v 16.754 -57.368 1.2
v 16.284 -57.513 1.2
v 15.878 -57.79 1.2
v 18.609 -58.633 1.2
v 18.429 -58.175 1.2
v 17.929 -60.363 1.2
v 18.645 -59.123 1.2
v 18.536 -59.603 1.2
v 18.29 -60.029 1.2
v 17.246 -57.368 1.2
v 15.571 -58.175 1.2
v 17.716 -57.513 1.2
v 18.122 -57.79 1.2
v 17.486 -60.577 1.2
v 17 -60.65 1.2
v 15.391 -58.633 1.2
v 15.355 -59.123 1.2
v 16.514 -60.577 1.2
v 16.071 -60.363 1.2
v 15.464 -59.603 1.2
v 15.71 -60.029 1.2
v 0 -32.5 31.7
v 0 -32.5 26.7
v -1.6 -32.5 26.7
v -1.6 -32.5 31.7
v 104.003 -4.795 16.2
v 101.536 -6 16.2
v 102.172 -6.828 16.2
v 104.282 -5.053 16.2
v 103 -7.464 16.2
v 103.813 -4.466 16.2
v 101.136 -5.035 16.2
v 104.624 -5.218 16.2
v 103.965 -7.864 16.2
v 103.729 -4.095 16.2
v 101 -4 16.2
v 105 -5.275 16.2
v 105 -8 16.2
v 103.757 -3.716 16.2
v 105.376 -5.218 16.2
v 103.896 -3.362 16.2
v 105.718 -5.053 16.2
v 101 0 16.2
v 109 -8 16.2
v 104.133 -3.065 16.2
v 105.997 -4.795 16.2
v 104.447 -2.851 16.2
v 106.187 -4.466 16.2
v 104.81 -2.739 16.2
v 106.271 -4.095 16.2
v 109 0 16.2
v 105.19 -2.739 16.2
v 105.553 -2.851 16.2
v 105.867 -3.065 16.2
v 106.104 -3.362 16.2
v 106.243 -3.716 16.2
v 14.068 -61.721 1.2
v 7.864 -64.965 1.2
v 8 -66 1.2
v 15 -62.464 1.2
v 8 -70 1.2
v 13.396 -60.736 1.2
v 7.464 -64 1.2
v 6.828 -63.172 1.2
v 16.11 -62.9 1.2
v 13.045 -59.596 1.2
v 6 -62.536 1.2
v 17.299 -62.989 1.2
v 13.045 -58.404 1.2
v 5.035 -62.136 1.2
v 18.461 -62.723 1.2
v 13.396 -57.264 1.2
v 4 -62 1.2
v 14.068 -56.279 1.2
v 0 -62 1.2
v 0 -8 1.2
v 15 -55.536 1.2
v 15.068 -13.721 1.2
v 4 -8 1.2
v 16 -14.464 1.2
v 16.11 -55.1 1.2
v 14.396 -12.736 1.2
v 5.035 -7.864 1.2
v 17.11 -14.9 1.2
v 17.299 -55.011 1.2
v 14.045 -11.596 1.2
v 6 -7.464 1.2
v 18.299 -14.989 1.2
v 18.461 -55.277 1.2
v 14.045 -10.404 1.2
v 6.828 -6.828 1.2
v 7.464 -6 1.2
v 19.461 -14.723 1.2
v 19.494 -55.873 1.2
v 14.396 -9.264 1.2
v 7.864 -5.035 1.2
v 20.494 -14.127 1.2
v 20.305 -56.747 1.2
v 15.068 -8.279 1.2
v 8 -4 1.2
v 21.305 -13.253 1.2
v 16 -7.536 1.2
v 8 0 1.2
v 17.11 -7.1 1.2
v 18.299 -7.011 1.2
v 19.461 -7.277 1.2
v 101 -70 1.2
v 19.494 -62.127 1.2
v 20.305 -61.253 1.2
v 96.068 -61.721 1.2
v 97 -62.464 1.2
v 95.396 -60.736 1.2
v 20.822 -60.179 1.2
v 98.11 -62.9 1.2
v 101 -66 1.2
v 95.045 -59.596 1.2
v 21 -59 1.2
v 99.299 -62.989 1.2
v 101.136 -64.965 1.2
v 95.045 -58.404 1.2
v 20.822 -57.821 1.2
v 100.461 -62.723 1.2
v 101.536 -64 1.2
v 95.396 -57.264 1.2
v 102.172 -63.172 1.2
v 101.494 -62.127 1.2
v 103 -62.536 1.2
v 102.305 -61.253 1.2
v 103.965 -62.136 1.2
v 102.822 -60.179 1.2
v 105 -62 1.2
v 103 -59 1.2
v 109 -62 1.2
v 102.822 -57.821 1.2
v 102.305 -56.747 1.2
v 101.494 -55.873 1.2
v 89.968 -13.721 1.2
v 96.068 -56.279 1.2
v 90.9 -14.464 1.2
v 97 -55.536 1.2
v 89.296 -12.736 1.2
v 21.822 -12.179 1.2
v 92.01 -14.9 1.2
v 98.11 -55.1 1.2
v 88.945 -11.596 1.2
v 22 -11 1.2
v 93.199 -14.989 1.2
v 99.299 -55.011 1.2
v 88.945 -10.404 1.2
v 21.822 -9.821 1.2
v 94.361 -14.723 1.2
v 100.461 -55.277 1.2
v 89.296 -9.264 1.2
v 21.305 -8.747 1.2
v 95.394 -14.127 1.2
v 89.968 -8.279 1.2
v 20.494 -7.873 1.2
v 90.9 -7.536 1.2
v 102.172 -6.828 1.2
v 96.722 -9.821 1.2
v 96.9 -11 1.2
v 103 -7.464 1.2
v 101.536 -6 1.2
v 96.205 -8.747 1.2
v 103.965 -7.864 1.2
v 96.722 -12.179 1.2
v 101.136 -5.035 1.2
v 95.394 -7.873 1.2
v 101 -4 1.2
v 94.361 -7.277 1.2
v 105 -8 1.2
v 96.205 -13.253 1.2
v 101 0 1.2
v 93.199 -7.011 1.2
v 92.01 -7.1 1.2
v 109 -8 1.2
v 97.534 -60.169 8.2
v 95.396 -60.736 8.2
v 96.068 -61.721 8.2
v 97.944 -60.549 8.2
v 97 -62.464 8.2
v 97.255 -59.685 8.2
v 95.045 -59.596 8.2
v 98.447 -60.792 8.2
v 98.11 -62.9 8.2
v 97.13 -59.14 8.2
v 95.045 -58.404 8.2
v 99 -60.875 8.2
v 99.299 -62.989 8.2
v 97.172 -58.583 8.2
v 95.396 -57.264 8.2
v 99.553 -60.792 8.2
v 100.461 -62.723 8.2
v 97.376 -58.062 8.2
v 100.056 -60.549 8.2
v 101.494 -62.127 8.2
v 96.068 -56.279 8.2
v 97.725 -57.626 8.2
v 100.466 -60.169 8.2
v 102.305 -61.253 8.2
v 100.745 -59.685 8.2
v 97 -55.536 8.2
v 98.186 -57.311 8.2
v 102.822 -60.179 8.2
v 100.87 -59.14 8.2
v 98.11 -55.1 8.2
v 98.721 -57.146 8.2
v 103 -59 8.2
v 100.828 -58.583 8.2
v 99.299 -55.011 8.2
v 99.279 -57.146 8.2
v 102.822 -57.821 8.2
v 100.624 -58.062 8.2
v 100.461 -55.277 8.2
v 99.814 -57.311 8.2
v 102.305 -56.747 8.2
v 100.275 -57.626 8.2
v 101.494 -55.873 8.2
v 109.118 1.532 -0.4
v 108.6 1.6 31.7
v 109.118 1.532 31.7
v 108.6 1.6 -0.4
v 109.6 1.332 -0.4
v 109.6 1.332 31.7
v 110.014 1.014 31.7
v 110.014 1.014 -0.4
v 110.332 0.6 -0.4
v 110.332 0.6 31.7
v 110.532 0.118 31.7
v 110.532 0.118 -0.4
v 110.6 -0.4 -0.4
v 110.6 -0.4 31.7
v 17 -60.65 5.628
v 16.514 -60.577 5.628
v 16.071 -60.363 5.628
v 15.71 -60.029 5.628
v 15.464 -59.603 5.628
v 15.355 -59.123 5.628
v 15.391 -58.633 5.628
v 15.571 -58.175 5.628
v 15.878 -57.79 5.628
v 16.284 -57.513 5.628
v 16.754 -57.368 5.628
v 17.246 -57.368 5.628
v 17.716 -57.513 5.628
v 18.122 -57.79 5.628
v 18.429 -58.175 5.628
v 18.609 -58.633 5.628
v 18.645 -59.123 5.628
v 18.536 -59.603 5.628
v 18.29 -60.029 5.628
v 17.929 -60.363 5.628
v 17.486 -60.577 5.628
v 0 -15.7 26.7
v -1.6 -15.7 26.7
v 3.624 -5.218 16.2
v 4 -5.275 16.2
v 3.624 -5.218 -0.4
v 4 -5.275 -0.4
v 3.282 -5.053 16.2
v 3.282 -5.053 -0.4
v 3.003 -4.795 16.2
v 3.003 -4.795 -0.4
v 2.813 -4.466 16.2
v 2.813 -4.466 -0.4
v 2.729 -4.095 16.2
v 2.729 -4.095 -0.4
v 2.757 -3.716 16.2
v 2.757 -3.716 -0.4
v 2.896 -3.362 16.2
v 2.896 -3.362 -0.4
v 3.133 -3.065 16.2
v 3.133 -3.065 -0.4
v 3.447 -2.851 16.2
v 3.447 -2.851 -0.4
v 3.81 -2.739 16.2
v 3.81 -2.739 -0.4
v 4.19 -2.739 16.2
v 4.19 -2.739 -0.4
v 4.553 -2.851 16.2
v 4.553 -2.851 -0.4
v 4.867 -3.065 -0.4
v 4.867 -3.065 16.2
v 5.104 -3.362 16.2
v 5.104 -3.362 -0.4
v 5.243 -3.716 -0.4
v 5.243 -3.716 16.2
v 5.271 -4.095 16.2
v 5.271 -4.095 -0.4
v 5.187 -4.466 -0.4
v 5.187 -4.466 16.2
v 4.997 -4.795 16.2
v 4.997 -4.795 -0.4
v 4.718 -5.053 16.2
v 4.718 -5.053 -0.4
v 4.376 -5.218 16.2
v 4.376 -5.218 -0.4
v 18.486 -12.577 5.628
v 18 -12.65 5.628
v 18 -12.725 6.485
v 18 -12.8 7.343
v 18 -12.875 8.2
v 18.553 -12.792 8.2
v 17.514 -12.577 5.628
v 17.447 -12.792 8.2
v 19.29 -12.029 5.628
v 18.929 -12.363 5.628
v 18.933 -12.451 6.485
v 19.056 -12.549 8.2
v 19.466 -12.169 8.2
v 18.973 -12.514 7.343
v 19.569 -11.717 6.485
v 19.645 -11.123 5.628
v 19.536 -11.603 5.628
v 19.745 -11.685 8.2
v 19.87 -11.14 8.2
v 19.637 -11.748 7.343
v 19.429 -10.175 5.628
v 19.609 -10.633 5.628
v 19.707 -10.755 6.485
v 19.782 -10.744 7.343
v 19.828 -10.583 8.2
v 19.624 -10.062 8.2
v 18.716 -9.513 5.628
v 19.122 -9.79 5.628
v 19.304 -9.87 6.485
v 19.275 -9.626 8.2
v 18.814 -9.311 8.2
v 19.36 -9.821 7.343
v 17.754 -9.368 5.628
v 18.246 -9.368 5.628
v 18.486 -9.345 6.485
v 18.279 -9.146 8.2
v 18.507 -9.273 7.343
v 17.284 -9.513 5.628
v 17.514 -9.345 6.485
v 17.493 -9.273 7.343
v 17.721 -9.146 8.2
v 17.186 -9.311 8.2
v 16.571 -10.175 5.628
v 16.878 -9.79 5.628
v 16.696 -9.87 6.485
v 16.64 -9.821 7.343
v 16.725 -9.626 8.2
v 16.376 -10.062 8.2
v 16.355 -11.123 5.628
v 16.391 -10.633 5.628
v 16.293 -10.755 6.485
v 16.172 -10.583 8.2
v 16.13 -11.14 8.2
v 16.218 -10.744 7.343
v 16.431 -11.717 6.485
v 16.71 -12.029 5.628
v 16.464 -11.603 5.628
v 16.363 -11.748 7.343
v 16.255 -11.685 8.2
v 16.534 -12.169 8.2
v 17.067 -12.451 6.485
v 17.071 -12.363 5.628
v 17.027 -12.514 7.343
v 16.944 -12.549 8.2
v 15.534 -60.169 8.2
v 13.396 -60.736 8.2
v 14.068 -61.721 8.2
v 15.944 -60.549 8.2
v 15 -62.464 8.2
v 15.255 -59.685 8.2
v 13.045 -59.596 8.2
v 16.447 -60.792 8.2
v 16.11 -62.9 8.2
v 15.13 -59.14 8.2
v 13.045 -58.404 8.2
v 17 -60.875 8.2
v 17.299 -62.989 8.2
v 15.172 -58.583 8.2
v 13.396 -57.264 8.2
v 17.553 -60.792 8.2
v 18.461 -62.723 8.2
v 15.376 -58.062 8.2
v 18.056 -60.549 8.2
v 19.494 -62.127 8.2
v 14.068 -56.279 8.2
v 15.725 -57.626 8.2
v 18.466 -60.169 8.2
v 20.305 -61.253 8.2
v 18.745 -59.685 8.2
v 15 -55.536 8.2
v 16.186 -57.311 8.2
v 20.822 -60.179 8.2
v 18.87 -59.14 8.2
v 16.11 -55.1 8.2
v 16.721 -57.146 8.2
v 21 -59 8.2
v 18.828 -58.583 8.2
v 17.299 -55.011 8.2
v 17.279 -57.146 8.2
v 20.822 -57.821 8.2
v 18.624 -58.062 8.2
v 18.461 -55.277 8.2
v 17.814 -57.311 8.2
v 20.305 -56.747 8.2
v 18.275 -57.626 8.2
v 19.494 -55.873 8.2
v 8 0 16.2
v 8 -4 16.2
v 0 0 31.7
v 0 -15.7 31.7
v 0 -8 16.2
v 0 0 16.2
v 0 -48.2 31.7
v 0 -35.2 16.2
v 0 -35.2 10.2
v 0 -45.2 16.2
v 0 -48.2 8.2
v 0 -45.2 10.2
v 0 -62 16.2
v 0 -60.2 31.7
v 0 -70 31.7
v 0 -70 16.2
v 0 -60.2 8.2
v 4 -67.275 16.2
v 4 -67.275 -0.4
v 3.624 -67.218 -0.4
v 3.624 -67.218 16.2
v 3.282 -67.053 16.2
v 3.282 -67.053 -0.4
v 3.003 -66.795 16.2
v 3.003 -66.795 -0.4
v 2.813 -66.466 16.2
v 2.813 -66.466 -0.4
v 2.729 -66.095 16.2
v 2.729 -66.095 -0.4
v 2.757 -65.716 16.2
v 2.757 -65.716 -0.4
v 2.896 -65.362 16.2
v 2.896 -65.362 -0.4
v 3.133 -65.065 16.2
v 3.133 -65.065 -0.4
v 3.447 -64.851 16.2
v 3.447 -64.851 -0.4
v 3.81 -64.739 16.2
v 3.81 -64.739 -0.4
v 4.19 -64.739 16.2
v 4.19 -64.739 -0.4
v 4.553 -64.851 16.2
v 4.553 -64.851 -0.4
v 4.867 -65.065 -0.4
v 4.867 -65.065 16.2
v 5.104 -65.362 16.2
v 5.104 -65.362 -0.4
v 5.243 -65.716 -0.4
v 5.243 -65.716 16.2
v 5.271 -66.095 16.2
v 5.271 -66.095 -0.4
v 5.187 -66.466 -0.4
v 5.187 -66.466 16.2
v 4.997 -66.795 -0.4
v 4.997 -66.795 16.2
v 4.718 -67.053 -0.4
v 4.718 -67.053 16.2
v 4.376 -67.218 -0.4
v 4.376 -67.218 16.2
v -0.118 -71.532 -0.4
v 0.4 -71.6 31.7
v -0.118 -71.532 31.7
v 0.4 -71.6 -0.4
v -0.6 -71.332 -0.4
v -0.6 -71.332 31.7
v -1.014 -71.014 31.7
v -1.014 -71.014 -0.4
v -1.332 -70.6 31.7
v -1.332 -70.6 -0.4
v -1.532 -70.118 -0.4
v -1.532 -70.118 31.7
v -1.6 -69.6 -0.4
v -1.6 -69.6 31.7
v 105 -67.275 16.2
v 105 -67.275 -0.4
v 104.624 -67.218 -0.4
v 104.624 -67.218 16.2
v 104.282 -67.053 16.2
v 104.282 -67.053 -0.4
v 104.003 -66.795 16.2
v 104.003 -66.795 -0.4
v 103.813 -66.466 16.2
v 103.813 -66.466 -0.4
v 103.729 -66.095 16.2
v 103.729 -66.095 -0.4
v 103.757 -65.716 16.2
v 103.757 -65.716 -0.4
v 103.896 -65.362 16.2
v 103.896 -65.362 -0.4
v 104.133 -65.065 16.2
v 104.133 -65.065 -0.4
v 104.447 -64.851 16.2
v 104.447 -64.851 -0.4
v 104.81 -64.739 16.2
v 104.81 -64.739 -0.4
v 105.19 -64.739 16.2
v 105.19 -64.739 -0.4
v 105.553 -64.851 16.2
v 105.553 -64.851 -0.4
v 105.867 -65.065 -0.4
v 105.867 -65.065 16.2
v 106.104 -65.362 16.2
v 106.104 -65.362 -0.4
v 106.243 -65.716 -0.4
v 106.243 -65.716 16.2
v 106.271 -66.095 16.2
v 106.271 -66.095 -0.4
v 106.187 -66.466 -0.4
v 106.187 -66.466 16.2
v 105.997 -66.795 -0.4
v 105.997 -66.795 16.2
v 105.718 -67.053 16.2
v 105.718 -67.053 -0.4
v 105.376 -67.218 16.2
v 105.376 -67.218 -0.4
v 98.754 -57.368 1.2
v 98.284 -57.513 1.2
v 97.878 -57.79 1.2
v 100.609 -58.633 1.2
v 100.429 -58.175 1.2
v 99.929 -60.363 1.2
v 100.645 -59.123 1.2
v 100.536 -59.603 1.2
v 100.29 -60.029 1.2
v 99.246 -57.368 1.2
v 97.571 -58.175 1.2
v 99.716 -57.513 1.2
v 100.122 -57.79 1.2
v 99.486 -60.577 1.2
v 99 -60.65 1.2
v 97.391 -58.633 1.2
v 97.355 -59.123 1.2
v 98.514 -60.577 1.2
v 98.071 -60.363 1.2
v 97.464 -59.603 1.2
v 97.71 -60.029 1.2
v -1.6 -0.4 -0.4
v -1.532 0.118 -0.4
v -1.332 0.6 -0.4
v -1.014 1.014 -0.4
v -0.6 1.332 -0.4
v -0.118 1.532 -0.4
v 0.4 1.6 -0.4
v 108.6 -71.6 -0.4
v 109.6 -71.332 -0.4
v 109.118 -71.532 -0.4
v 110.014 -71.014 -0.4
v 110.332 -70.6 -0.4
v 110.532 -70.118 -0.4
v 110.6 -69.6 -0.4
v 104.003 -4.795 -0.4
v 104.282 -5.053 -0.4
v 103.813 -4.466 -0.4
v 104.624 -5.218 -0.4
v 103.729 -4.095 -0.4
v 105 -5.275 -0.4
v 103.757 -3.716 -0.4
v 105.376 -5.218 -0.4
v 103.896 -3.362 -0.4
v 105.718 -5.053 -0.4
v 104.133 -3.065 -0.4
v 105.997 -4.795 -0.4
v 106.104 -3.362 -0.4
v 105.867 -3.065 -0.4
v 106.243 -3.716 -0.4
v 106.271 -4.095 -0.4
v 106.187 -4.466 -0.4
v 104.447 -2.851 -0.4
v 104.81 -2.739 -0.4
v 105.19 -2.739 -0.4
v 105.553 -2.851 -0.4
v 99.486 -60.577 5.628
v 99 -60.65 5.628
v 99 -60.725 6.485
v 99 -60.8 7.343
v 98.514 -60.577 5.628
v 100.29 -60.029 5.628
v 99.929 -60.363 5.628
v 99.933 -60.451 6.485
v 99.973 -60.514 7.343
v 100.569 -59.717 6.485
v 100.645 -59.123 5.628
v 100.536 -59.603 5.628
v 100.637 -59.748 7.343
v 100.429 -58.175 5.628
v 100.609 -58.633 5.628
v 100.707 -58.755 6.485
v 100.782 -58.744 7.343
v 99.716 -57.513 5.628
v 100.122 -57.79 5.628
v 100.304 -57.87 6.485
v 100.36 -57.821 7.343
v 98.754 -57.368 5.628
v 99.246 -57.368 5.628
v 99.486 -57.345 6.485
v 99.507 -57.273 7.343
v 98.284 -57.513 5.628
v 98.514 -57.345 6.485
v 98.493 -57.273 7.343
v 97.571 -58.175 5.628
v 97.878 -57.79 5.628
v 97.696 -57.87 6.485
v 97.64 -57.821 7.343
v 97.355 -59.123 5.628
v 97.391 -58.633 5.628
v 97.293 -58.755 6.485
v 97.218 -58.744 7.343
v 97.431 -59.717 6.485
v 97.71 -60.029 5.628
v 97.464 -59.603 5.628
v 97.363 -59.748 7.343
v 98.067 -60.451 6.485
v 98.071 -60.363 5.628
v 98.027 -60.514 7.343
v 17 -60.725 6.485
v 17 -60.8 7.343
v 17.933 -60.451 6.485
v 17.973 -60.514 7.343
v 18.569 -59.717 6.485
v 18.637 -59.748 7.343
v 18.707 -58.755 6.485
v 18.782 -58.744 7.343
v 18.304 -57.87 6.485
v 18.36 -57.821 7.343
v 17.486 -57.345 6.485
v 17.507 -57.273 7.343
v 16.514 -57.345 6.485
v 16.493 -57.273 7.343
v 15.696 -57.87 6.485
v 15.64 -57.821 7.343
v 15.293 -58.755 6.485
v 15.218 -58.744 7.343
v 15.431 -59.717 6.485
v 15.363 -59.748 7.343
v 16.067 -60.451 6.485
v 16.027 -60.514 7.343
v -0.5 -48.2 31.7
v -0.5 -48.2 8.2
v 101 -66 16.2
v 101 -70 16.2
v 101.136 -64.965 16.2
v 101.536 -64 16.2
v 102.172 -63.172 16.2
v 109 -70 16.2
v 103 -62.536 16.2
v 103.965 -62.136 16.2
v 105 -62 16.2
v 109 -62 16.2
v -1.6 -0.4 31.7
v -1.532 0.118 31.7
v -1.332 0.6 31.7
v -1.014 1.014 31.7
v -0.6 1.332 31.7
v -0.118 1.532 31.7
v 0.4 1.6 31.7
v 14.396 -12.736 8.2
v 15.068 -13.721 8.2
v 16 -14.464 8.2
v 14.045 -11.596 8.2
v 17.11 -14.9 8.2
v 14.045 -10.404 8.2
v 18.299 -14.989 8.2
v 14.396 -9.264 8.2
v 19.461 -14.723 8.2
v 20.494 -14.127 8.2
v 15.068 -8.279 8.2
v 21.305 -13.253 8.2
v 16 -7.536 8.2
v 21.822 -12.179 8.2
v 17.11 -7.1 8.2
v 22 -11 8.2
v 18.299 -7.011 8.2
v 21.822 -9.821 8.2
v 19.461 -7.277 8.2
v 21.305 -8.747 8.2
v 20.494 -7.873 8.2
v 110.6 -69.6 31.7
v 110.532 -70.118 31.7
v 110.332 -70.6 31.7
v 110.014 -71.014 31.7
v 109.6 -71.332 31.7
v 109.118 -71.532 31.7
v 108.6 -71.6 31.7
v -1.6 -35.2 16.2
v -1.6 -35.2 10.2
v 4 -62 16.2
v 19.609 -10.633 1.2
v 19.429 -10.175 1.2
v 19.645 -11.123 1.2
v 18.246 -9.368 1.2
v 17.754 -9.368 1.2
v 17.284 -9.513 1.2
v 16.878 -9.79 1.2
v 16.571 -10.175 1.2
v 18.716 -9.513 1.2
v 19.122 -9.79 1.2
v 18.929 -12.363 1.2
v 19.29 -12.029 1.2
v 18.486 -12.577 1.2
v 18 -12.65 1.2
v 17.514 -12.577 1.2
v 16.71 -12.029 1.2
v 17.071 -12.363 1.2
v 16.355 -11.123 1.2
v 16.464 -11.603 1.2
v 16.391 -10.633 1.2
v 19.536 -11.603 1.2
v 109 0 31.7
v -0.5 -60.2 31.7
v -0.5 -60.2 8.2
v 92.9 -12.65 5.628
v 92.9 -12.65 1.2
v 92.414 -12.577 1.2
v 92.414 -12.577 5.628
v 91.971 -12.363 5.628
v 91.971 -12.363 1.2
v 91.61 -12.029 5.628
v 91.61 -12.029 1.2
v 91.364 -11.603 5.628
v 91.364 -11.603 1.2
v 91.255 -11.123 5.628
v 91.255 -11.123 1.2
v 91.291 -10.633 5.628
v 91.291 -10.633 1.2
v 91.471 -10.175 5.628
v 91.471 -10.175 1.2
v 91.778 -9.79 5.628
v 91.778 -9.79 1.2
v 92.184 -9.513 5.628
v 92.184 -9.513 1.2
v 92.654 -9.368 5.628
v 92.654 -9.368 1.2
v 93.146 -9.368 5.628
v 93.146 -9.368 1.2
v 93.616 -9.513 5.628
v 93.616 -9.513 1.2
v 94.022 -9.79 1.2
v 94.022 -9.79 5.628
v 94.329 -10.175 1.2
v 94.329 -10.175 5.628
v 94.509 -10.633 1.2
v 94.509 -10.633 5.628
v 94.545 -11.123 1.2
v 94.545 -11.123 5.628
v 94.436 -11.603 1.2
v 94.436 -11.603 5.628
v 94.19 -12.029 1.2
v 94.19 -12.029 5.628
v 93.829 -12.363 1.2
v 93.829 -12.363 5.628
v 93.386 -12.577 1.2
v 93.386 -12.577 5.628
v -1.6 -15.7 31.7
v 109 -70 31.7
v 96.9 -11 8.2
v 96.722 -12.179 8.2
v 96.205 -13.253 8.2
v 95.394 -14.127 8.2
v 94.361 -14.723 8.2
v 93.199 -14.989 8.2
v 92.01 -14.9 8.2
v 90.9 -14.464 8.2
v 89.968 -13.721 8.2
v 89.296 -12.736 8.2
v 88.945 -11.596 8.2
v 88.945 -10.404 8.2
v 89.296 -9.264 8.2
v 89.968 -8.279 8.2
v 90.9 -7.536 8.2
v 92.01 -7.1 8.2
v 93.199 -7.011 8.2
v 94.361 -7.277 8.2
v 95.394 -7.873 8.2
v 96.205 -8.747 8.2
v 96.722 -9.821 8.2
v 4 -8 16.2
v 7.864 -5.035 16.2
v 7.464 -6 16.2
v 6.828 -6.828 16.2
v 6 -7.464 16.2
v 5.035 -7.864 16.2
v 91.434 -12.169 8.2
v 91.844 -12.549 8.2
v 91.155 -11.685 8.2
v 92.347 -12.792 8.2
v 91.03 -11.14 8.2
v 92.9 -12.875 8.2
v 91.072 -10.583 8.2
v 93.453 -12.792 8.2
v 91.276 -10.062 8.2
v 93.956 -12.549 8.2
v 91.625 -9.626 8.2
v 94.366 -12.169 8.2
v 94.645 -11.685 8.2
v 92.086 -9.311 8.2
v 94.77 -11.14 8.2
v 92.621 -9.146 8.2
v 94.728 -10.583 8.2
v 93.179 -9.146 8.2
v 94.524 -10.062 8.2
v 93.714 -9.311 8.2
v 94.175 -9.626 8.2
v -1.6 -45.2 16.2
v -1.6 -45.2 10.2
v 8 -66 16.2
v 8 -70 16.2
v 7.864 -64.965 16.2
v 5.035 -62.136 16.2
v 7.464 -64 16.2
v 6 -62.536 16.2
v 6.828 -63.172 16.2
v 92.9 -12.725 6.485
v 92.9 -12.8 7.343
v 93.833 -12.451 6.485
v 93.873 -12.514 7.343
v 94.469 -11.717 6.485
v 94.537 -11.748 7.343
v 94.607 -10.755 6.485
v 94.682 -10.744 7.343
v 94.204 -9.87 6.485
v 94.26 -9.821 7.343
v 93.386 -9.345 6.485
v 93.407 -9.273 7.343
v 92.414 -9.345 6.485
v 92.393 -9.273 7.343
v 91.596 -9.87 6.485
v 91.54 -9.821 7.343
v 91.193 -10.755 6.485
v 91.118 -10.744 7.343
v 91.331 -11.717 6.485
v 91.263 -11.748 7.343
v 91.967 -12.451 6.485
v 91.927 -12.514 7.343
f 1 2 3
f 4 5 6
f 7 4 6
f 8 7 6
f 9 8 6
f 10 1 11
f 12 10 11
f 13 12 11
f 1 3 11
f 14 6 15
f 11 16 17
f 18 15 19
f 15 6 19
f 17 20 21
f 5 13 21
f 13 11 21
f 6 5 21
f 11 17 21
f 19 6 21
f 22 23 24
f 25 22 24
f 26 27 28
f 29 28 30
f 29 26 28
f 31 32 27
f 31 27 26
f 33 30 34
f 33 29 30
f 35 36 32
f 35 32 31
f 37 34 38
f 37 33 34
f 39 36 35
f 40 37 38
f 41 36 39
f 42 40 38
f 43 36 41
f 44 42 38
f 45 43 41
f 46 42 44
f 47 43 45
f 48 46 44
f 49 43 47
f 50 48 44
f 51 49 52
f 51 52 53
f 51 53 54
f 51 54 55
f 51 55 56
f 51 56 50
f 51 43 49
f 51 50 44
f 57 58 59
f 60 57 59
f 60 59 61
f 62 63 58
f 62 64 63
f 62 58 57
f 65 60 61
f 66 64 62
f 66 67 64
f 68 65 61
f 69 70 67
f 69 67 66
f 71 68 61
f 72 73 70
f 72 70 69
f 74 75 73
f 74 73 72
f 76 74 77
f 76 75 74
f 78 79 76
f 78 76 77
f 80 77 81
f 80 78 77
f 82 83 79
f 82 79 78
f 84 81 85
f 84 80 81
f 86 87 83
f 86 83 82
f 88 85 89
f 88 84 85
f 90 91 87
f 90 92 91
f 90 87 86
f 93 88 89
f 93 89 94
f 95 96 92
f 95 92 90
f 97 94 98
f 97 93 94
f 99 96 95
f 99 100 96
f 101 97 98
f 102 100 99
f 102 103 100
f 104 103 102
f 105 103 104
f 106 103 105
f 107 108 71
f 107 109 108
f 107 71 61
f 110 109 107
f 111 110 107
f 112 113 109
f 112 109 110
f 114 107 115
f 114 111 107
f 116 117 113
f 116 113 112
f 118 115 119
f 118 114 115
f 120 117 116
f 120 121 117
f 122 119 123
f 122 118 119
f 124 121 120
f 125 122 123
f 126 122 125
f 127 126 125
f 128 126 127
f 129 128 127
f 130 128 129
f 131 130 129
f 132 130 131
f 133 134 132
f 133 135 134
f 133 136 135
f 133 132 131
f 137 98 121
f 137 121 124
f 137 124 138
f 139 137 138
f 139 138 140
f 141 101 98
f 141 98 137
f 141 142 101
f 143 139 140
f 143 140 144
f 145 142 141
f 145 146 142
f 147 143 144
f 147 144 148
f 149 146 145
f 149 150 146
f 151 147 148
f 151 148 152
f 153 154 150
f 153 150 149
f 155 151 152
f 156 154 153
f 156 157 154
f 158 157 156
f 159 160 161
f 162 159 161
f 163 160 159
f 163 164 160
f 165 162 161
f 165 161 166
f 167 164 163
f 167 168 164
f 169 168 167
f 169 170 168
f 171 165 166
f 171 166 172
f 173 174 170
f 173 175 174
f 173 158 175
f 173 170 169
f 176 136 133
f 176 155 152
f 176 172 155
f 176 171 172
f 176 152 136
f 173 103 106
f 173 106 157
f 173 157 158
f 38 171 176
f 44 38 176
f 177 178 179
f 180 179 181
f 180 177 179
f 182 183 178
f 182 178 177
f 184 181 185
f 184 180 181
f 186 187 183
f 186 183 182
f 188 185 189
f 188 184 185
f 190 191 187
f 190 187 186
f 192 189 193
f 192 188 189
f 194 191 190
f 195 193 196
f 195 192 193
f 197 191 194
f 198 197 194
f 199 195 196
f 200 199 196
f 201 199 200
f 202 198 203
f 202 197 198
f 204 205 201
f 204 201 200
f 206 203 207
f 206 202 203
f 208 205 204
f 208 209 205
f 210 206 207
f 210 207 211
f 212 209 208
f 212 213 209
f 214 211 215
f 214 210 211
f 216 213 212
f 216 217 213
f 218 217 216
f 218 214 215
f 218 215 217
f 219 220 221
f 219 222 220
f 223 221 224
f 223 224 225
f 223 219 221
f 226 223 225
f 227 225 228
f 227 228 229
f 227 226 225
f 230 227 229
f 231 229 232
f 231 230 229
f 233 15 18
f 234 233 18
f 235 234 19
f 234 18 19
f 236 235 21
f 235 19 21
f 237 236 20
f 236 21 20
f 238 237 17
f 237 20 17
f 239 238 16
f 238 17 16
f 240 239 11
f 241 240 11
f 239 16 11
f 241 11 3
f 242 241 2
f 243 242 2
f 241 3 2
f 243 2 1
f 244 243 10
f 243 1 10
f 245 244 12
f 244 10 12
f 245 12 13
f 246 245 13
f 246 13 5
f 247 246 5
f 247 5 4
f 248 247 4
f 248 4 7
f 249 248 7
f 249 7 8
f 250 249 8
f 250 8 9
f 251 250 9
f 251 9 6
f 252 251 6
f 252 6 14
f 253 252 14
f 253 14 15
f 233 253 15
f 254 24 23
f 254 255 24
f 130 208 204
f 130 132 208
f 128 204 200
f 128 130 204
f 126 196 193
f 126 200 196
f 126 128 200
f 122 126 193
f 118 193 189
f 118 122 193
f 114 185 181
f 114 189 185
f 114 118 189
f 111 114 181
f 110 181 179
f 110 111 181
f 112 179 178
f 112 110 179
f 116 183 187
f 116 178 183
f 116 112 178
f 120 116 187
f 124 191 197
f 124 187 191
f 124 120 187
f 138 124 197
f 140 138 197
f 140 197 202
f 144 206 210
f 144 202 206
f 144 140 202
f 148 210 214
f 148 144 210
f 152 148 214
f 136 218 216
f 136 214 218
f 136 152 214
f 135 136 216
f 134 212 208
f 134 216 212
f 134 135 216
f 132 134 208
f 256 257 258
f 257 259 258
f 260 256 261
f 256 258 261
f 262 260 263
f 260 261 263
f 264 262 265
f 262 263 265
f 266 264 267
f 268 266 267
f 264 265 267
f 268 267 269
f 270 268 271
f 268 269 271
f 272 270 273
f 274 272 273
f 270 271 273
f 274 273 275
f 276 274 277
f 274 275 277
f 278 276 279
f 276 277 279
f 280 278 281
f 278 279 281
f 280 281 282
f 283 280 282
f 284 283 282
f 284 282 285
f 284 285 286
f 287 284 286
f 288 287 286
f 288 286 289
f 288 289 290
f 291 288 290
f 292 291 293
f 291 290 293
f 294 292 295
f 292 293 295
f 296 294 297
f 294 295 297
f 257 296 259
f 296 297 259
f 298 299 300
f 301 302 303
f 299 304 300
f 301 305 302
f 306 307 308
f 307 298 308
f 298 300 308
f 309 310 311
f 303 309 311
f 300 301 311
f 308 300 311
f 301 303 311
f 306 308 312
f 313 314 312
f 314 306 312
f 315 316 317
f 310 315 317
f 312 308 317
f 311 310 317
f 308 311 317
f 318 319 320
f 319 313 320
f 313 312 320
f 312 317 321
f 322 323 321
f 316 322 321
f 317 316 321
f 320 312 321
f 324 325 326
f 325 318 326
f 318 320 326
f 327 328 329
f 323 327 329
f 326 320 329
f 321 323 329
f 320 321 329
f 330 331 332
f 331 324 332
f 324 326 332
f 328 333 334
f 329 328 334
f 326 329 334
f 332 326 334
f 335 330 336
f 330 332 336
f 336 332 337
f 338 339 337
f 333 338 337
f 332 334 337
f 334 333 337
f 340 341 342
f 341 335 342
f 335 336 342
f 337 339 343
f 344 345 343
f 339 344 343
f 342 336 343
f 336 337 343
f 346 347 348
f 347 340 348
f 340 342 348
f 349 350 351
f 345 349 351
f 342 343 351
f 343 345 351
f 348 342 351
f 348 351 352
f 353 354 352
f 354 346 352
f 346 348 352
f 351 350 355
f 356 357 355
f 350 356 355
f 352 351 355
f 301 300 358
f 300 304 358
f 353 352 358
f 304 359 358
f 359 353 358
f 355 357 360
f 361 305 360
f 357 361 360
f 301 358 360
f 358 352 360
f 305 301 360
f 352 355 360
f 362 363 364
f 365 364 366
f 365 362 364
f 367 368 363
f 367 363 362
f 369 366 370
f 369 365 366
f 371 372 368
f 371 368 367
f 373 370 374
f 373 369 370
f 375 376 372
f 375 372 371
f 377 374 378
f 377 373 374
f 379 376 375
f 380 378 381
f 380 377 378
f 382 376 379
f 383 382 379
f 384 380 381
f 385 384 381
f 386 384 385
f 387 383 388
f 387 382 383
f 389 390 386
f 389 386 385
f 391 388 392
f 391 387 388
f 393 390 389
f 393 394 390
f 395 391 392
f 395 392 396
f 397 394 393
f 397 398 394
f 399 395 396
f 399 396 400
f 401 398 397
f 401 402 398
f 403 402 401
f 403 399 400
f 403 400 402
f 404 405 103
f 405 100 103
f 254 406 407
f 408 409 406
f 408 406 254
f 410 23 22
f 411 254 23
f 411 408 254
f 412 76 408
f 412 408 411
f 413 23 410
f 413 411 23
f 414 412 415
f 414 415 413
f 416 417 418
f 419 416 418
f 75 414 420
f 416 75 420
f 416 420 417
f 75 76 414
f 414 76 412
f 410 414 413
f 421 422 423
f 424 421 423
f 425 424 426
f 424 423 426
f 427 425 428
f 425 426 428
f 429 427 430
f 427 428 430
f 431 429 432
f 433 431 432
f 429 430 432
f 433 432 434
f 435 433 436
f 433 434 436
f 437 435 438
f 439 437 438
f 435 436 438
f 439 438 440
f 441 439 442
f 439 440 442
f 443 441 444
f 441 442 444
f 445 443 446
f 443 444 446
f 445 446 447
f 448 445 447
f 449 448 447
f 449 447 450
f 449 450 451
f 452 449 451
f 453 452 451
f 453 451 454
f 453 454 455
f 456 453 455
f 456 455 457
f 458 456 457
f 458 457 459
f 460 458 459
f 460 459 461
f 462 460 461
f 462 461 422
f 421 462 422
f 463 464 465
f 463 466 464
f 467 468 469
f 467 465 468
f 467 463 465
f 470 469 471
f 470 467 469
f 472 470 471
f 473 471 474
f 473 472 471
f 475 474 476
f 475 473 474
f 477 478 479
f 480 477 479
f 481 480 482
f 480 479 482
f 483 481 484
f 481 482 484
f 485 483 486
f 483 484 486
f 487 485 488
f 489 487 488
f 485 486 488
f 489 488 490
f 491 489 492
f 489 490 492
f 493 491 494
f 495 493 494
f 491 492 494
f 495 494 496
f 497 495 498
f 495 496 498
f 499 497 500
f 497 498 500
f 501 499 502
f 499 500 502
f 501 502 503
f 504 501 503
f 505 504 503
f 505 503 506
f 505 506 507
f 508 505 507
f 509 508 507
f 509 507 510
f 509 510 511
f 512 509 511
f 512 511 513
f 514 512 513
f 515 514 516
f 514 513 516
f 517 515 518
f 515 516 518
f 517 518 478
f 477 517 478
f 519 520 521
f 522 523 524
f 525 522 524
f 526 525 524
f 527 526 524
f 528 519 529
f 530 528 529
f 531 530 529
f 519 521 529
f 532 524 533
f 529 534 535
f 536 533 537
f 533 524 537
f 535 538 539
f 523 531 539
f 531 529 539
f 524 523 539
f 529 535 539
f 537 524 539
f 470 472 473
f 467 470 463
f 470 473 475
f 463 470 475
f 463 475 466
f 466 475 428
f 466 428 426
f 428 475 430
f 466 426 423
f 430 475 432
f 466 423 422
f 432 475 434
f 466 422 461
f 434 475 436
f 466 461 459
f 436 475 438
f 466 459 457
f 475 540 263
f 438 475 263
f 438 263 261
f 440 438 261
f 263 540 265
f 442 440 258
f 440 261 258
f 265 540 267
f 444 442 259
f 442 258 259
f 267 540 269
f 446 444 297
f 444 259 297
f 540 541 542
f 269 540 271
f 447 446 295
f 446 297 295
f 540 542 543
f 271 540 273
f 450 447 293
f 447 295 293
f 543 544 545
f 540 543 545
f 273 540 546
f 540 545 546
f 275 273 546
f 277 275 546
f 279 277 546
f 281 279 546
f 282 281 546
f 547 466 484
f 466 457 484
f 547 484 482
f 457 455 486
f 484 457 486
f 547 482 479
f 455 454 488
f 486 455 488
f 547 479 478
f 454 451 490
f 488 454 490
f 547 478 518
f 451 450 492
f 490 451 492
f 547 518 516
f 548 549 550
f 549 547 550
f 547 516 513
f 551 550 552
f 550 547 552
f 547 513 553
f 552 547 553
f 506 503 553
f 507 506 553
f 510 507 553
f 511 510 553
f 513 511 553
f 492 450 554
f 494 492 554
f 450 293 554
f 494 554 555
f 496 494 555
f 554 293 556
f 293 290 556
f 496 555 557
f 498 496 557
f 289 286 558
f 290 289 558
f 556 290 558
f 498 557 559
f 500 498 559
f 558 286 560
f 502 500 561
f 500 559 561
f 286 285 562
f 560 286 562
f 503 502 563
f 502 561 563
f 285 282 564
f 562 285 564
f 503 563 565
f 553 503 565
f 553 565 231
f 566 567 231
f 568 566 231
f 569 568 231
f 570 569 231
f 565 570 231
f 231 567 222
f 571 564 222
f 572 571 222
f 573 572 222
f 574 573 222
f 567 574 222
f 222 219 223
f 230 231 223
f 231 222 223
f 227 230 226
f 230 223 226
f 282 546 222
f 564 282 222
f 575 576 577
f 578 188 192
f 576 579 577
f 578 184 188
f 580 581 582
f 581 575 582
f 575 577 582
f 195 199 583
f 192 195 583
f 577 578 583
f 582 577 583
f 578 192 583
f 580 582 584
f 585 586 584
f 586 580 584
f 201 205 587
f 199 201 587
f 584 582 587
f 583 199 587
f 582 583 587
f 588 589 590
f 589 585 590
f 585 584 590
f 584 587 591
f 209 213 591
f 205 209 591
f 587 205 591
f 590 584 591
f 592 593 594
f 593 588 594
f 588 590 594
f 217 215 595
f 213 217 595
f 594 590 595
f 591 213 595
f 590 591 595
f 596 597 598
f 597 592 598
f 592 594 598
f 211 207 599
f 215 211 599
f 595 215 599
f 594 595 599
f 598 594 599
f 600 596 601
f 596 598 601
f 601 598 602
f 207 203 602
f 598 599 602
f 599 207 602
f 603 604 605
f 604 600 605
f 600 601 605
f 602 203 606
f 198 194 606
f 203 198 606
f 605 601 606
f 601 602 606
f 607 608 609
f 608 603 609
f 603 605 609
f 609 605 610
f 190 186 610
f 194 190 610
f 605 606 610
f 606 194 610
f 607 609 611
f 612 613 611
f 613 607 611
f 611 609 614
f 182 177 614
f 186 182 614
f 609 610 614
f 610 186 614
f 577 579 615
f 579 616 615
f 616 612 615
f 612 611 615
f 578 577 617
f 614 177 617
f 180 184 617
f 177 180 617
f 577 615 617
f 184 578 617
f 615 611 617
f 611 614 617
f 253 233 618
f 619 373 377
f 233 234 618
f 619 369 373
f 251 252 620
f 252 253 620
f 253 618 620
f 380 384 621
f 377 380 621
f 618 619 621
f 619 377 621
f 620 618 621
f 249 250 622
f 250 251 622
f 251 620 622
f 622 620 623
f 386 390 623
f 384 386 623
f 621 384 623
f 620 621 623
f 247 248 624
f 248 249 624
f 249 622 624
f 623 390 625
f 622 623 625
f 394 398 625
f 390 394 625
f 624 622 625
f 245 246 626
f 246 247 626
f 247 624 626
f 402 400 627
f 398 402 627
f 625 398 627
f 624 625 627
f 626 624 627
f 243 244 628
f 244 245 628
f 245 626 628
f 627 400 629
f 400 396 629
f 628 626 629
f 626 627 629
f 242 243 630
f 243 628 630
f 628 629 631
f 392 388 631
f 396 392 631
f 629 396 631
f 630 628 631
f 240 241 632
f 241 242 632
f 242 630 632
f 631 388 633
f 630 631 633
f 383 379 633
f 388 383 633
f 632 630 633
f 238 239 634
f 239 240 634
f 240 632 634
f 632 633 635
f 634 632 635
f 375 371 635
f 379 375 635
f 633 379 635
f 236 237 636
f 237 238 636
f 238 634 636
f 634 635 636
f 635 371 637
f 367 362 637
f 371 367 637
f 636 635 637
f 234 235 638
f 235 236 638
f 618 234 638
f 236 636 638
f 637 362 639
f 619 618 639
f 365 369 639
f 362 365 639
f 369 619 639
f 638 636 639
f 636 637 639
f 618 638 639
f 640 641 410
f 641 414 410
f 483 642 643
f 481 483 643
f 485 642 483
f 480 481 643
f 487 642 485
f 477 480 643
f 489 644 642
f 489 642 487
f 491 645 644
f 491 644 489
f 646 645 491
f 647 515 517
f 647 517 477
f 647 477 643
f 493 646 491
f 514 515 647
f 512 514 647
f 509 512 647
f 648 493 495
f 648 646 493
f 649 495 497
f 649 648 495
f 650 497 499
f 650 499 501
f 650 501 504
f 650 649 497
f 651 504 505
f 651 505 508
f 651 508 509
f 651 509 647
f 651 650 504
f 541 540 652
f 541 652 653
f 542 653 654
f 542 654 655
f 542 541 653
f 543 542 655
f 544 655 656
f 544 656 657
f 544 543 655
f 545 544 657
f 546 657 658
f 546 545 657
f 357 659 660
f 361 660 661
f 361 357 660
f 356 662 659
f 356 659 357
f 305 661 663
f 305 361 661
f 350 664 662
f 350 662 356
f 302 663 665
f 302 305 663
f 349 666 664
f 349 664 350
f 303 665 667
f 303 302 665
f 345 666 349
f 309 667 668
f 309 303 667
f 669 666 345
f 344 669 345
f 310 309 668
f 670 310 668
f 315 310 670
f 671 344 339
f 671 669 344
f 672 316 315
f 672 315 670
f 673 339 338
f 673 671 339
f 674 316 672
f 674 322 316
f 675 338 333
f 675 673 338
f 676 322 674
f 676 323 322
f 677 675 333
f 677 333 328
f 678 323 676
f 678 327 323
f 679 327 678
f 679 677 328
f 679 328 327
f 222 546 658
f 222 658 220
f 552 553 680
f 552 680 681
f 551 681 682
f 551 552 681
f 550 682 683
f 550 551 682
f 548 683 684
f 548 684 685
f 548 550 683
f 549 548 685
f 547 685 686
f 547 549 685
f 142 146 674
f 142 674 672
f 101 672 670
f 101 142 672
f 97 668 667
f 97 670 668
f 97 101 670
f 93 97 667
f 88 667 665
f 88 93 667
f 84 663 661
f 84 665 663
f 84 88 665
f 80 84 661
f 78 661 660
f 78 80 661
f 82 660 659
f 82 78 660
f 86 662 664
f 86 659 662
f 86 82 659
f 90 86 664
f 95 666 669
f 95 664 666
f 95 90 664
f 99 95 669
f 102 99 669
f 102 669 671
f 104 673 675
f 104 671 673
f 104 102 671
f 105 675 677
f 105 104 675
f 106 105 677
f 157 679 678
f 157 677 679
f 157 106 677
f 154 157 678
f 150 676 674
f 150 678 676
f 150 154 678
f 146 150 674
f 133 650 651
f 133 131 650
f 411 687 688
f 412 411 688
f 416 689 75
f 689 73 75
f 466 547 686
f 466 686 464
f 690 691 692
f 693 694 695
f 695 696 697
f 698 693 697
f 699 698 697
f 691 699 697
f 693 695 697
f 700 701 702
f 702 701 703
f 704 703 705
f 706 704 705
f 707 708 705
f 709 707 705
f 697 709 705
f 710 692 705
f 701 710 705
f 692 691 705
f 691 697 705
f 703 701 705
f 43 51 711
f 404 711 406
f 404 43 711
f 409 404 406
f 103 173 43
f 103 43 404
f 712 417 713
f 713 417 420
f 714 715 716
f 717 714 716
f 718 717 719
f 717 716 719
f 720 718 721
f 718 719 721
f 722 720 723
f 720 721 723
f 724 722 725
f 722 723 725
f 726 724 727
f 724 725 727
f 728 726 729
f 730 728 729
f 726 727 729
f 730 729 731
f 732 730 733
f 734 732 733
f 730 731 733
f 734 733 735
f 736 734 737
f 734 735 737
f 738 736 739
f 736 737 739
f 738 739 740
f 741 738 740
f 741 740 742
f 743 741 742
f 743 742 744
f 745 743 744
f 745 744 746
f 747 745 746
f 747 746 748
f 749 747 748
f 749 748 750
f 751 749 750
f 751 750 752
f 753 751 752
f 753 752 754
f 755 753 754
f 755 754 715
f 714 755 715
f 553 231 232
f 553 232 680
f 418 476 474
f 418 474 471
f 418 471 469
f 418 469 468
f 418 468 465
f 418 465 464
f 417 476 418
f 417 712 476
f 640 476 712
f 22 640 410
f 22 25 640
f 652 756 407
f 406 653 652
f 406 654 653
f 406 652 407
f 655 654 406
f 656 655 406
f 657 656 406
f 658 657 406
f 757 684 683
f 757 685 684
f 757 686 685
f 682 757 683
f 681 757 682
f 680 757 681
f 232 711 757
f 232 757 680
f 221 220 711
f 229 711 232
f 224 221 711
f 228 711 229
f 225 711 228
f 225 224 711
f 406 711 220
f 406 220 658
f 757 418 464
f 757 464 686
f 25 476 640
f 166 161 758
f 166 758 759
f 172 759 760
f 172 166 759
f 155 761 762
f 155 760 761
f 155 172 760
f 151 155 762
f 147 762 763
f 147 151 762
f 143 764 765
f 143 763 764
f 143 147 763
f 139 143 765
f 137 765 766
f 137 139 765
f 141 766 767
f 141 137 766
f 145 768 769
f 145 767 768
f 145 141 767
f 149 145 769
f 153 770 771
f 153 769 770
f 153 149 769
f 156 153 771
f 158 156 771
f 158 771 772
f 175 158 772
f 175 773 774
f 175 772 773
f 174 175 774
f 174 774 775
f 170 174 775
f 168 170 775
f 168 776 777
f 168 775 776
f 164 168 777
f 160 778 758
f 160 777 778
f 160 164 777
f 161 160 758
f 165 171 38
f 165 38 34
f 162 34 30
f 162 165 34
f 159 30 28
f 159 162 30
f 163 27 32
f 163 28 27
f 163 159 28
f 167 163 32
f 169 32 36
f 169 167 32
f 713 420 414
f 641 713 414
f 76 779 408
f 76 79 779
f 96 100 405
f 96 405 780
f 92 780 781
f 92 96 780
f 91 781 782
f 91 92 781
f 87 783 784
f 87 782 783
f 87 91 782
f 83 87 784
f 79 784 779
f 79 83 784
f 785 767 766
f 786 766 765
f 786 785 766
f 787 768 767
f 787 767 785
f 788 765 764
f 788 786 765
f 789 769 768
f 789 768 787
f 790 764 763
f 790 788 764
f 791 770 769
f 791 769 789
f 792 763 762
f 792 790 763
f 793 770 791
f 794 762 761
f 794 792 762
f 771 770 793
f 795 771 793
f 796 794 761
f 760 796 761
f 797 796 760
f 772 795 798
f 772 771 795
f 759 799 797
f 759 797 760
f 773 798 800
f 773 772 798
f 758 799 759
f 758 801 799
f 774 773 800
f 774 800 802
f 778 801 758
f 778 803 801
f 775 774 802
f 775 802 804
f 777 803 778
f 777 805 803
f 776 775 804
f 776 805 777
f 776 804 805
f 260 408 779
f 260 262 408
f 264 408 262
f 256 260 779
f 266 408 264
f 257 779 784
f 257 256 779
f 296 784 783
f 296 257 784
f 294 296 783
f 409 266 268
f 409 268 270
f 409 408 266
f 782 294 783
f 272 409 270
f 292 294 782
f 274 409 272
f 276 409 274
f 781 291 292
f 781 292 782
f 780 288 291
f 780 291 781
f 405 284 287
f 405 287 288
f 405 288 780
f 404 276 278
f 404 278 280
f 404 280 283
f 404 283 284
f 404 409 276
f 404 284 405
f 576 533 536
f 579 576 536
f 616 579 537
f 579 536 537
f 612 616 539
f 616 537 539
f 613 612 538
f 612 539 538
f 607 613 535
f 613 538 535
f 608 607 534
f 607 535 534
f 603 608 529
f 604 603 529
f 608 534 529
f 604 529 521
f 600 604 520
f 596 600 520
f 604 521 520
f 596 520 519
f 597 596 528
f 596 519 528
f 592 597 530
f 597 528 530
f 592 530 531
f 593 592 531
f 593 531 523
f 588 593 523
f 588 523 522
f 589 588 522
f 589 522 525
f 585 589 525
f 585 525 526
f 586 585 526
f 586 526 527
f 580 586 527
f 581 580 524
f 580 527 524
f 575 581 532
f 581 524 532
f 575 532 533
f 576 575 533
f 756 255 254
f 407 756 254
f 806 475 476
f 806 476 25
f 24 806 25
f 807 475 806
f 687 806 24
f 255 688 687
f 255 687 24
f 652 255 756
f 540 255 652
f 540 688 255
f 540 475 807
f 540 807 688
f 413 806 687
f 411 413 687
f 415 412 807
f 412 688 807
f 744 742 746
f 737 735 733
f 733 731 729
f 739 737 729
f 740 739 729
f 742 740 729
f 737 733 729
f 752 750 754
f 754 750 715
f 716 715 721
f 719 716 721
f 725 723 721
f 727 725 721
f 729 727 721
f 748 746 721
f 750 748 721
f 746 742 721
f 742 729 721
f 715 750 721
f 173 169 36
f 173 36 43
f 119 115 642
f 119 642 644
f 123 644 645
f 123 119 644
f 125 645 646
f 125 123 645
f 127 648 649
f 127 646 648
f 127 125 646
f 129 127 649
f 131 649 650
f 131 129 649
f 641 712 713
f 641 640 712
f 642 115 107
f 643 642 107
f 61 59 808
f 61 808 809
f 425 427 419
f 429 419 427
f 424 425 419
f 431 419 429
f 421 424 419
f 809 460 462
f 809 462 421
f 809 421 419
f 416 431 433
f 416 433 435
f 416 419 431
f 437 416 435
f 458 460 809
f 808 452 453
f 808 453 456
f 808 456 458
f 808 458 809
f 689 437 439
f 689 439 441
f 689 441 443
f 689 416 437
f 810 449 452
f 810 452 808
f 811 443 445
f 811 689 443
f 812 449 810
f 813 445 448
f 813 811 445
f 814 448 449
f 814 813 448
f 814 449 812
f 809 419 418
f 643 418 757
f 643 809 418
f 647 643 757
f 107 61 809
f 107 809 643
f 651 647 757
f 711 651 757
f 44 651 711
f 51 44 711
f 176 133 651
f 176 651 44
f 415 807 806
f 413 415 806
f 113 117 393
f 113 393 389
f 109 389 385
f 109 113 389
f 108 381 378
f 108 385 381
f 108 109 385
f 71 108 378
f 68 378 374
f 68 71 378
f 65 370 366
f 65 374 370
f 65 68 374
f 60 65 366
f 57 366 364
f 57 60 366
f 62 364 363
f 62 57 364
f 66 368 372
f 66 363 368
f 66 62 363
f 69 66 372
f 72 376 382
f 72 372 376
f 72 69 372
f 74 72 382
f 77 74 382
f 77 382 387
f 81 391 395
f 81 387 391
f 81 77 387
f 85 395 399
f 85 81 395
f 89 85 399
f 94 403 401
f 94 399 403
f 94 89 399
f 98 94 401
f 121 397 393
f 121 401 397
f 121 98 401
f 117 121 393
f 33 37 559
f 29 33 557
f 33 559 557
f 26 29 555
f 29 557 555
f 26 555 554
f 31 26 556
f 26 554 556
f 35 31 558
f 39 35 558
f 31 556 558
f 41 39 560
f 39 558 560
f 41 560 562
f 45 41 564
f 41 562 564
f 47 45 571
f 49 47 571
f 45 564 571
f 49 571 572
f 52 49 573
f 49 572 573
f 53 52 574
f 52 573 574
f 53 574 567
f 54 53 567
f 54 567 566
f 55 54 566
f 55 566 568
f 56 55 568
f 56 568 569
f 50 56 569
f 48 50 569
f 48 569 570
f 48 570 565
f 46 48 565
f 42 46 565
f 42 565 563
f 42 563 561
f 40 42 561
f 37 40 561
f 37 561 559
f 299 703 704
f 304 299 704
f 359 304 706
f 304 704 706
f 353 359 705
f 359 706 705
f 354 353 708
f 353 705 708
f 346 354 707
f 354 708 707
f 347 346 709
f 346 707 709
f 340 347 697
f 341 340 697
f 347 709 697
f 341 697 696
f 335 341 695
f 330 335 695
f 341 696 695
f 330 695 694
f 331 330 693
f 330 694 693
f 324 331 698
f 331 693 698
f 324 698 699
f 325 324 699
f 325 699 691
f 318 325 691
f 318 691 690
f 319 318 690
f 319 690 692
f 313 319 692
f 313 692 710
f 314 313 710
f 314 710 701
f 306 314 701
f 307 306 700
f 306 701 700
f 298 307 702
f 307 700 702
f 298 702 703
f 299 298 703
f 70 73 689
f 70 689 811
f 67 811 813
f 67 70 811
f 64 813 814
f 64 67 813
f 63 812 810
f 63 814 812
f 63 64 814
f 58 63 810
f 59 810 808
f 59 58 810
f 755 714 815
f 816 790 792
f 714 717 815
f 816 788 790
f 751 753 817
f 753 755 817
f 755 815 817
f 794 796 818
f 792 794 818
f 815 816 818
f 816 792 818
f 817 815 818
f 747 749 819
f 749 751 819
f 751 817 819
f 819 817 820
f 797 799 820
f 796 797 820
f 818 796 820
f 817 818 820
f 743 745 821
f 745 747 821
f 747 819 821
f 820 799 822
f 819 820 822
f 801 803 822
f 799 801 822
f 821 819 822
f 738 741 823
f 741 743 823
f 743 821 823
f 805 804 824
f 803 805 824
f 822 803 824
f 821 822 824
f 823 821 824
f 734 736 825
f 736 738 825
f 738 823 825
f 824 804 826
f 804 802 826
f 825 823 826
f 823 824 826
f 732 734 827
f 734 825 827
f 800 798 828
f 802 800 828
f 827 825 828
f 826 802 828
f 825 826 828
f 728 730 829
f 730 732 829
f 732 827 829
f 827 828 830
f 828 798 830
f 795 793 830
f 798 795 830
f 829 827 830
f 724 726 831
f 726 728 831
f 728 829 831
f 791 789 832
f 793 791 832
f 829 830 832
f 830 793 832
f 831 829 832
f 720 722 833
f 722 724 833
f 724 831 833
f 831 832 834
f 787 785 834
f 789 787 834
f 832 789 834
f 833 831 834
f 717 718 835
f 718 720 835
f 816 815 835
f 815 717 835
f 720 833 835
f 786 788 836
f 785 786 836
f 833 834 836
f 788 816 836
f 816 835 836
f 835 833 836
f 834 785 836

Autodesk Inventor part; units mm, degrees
ref_plane "YZ Plane" through (0, 0, 0) normal (1, 0, 0) x (0, 1, 0)
ref_plane "XZ Plane" through (0, 0, 0) normal (0, 1, 0) x (-1, 0, 0)
ref_plane "XY Plane" through (0, 0, 0) normal (0, 0, 1) x (1, 0, 0)
sketch "zaklad" plane through (0, 0, 0) normal (0, 0, 1) x (1, 0, 0)
  line L0 (0, 0) -> (109, 0)
  line L1 (109, 0) -> (109, -70)
  line L2 (109, -70) -> (0, -70)
  line L3 (0, -70) -> (0, 0)
  dimension "d0" = 109
  dimension "d1" = 70
extrude "Extrusion1" add sketch "zaklad" along normal blind 1.2 and the other way blind 0.4
sketch "uchyt_pro_desku" plane through (0, 0, 1.2) normal (0, 0, 1) x (1, 0, 0)
  line L0 (0, 0) -> (0, -70) projected
  line L1 (0, -35) -> (109, -35)
  line L2 (109, -70) -> (109, 0) projected
  circle A0 centre (17, -59) radius 4
  circle A1 centre (18, -11) radius 4
  circle A2 centre (92.9, -11) radius 4
  circle A3 centre (99, -59) radius 4
  dimension "d4" = 8
  dimension "d5" = 17
  dimension "d6" = 24
  dimension "d8" = 8
  dimension "d9" = 74.9
  dimension "d11" = 8
  dimension "d12" = 82
  dimension "d73" = 18
extrude "Extrusion2" add sketch "uchyt_pro_desku" along normal blind 7
sketch "stena_RJ45" plane through (0, 0, 1.2) normal (0, 0, 1) x (1, 0, 0)
  line L0 (-1.6, -15.7) -> (0, -15.7)
  line L1 (0, -15.7) -> (0, -32.5)
  line L2 (0, -32.5) -> (-1.6, -32.5)
  line L3 (-1.6, -32.5) -> (-1.6, -15.7)
  circle A0 centre (18, -11) radius 4 projected
  line L4 (0, 0) -> (0, -70) projected
  dimension "d17" = 1.6
  dimension "d18" = 16.8
  dimension "d19" = 4.7
  dimension "d20" = 0
sketch "srouby_upevneni" plane through (0, 0, 1.2) normal (0, 0, 1) x (1, 0, 0)
  arc A0 (8, -66) -> (4, -62) centre (4, -66) ccw
  line L0 (0, -70) -> (109, -70) projected
  line L1 (0, 0) -> (0, -70) projected
  line L2 (8, -66) -> (8, -70)
  line L3 (4, -62) -> (0, -62)
  line L4 (0, -62) -> (0, -70)
  line L5 (8, -70) -> (0, -70)
  line L6 (109, -70) -> (109, 0) projected
  line L7 (109, -35) -> (0, -35)
  line L8 (54.5, -35) -> (54.5, -22.3833)
  arc A1 (4, -8) -> (8, -4) centre (4, -4) ccw
  line L9 (8, -4) -> (8, 0)
  line L10 (4, -8) -> (0, -8)
  line L11 (0, -8) -> (0, 0)
  line L12 (8, 0) -> (0, 0)
  arc A2 (105, -62) -> (101, -66) centre (105, -66) ccw
  line L13 (101, -66) -> (101, -70)
  line L14 (105, -62) -> (109, -62)
  line L15 (109, -62) -> (109, -70)
  line L16 (101, -70) -> (109, -70)
  line L17 (101, -4) -> (101, 0)
  arc A3 (101, -4) -> (105, -8) centre (105, -4) ccw
  line L18 (105, -8) -> (109, -8)
  line L19 (109, -8) -> (109, 0)
  line L20 (101, 0) -> (109, 0)
  dimension "d21" = 8
sketch "steny" plane through (0, 0, 1.2) normal (0, 0, 1) x (1, 0, 0)
  line L0 (0, -70) -> (109, -70) projected
  line L1 (109, -70) -> (109, 0) projected
  line L2 (109, 0) -> (0, 0) projected
  line L3 (0, 0) -> (0, -70) projected
  line L4 (0, -70) -> (0, -32.5)
  line L5 (0, -15.7) -> (0, 0)
  line L6 (0, -32.5) -> (-1.6, -32.5) projected
  line L7 (-1.6, -15.7) -> (0, -15.7) projected
  line L8 (-1.6, 1.6) -> (110.6, 1.6)
  line L9 (110.6, 1.6) -> (110.6, -71.6)
  line L10 (110.6, -71.6) -> (-1.6, -71.6)
  line L11 (-1.6, -71.6) -> (-1.6, -32.5)
  line L12 (-1.6, -15.7) -> (-1.6, 1.6)
  dimension "d74" = 1.6
extrude "Extrusion3" add sketch "steny" along normal blind 30.5 and the other way blind 1.6 contours L0 L1 L2 L3 L7 L12 L8 L9 L10 L11 L6
extrude "Extrusion4" add sketch "stena_RJ45" along normal blind 25.5 and the other way blind 1.6 contours L0 L1 L2 L3
extrude "Extrusion5" add sketch "srouby_upevneni" along normal blind 15 contours L2 L0 L1 L3 A0 | L1 L12 L9 A1 L10 | L18 A3 L17 L20 L6 | L13 A2 L14 L6 L0
sketch "diry" plane through (0, 0, 1.2) normal (0, 0, 1) x (1, 0, 0)
  arc A0 (8, -66) -> (4, -62) centre (4, -66) ccw projected
  arc A1 (4, -8) -> (8, -4) centre (4, -4) ccw projected
  arc A2 (101, -4) -> (105, -8) centre (105, -4) ccw projected
  arc A3 (105, -62) -> (101, -66) centre (105, -66) ccw projected
  point P0 (116, -66)
  point P1 (116, -66)
hole "Hole1" at (105, -66, 1.2) at (4, -4, 1.2) at (4, -66, 1.2) at (105, -4, 1.2) direction (0, 0, -1) diameter 2.55 end through all both
sketch "uchyt_pro_desku_diry" plane through (99, -59, 8.2) normal (0, 0, 1) x (1, 0, 0)
  circle A0 centre (0, 0) radius 4 projected
  circle A1 centre (-82, 0) radius 4 projected
  circle A2 centre (-81, 48) radius 4 projected
  circle A3 centre (-6.1, 48) radius 4 projected
  point P0 (-99, 59)
hole "Hole2" at (99, -59, 8.2) at (17, -59, 8.2) at (18, -11, 8.2) at (92.9, -11, 8.2) direction (0, 0, -1) diameter 3.3 depth 7 countersink diameter 3.75 countersink angle 10
sketch "dira_USB" plane through (-1.6, -71.9, -0.4) normal (-1, 0, 0) x (0, 0, 1)
  line L0 (16.6, 36.7) -> (10.6, 36.7)
  line L1 (10.6, 36.7) -> (10.6, 26.7)
  line L2 (10.6, 26.7) -> (16.6, 26.7)
  line L3 (16.6, 26.7) -> (16.6, 36.7)
  line L4 (27.1, 39.4) -> (32.1, 39.4) projected
  line L5 (0, 0.3) -> (0, 73.5) projected
  point P0 (0.4, 71.9)
  point P1 (0, 0)
  point P2 (0, 73.8)
  dimension "d60" = 6
  dimension "d61" = 10
  dimension "d62" = 2.7
  dimension "d63" = 10.6
extrude "Extrusion7" cut sketch "dira_USB" against normal blind 2
sketch "vyrez_napajeci_jack_nepouzivany" plane through (0, -70, 31.7) normal (1, 0, 0) x (0, 0, -1)
  line L0 (23.5, 21.8) -> (-6.5, 21.8)
  line L1 (-6.5, 21.8) -> (-6.5, 9.8)
  line L2 (-6.5, 9.8) -> (23.5, 9.8)
  line L3 (23.5, 9.8) -> (23.5, 21.8)
  line L4 (30.5, 62) -> (30.5, 8) projected
  line L5 (21.5, 24.8) -> (15.5, 24.8) projected
  point P0 (31.7, 70)
  dimension "d66" = 30
  dimension "d67" = 12
  dimension "d68" = 7
  dimension "d69" = 3
extrude "Extrusion8" cut sketch "vyrez_napajeci_jack_nepouzivany" against normal blind 0.5
fillet "Fillet1" radius 2 4 edges at (-1.6, -71.6, 15.65) (-1.6, 1.6, 15.65) (110.6, -71.6, 15.65) (110.6, 1.6, 15.65)
properties part number "case_bottom"
